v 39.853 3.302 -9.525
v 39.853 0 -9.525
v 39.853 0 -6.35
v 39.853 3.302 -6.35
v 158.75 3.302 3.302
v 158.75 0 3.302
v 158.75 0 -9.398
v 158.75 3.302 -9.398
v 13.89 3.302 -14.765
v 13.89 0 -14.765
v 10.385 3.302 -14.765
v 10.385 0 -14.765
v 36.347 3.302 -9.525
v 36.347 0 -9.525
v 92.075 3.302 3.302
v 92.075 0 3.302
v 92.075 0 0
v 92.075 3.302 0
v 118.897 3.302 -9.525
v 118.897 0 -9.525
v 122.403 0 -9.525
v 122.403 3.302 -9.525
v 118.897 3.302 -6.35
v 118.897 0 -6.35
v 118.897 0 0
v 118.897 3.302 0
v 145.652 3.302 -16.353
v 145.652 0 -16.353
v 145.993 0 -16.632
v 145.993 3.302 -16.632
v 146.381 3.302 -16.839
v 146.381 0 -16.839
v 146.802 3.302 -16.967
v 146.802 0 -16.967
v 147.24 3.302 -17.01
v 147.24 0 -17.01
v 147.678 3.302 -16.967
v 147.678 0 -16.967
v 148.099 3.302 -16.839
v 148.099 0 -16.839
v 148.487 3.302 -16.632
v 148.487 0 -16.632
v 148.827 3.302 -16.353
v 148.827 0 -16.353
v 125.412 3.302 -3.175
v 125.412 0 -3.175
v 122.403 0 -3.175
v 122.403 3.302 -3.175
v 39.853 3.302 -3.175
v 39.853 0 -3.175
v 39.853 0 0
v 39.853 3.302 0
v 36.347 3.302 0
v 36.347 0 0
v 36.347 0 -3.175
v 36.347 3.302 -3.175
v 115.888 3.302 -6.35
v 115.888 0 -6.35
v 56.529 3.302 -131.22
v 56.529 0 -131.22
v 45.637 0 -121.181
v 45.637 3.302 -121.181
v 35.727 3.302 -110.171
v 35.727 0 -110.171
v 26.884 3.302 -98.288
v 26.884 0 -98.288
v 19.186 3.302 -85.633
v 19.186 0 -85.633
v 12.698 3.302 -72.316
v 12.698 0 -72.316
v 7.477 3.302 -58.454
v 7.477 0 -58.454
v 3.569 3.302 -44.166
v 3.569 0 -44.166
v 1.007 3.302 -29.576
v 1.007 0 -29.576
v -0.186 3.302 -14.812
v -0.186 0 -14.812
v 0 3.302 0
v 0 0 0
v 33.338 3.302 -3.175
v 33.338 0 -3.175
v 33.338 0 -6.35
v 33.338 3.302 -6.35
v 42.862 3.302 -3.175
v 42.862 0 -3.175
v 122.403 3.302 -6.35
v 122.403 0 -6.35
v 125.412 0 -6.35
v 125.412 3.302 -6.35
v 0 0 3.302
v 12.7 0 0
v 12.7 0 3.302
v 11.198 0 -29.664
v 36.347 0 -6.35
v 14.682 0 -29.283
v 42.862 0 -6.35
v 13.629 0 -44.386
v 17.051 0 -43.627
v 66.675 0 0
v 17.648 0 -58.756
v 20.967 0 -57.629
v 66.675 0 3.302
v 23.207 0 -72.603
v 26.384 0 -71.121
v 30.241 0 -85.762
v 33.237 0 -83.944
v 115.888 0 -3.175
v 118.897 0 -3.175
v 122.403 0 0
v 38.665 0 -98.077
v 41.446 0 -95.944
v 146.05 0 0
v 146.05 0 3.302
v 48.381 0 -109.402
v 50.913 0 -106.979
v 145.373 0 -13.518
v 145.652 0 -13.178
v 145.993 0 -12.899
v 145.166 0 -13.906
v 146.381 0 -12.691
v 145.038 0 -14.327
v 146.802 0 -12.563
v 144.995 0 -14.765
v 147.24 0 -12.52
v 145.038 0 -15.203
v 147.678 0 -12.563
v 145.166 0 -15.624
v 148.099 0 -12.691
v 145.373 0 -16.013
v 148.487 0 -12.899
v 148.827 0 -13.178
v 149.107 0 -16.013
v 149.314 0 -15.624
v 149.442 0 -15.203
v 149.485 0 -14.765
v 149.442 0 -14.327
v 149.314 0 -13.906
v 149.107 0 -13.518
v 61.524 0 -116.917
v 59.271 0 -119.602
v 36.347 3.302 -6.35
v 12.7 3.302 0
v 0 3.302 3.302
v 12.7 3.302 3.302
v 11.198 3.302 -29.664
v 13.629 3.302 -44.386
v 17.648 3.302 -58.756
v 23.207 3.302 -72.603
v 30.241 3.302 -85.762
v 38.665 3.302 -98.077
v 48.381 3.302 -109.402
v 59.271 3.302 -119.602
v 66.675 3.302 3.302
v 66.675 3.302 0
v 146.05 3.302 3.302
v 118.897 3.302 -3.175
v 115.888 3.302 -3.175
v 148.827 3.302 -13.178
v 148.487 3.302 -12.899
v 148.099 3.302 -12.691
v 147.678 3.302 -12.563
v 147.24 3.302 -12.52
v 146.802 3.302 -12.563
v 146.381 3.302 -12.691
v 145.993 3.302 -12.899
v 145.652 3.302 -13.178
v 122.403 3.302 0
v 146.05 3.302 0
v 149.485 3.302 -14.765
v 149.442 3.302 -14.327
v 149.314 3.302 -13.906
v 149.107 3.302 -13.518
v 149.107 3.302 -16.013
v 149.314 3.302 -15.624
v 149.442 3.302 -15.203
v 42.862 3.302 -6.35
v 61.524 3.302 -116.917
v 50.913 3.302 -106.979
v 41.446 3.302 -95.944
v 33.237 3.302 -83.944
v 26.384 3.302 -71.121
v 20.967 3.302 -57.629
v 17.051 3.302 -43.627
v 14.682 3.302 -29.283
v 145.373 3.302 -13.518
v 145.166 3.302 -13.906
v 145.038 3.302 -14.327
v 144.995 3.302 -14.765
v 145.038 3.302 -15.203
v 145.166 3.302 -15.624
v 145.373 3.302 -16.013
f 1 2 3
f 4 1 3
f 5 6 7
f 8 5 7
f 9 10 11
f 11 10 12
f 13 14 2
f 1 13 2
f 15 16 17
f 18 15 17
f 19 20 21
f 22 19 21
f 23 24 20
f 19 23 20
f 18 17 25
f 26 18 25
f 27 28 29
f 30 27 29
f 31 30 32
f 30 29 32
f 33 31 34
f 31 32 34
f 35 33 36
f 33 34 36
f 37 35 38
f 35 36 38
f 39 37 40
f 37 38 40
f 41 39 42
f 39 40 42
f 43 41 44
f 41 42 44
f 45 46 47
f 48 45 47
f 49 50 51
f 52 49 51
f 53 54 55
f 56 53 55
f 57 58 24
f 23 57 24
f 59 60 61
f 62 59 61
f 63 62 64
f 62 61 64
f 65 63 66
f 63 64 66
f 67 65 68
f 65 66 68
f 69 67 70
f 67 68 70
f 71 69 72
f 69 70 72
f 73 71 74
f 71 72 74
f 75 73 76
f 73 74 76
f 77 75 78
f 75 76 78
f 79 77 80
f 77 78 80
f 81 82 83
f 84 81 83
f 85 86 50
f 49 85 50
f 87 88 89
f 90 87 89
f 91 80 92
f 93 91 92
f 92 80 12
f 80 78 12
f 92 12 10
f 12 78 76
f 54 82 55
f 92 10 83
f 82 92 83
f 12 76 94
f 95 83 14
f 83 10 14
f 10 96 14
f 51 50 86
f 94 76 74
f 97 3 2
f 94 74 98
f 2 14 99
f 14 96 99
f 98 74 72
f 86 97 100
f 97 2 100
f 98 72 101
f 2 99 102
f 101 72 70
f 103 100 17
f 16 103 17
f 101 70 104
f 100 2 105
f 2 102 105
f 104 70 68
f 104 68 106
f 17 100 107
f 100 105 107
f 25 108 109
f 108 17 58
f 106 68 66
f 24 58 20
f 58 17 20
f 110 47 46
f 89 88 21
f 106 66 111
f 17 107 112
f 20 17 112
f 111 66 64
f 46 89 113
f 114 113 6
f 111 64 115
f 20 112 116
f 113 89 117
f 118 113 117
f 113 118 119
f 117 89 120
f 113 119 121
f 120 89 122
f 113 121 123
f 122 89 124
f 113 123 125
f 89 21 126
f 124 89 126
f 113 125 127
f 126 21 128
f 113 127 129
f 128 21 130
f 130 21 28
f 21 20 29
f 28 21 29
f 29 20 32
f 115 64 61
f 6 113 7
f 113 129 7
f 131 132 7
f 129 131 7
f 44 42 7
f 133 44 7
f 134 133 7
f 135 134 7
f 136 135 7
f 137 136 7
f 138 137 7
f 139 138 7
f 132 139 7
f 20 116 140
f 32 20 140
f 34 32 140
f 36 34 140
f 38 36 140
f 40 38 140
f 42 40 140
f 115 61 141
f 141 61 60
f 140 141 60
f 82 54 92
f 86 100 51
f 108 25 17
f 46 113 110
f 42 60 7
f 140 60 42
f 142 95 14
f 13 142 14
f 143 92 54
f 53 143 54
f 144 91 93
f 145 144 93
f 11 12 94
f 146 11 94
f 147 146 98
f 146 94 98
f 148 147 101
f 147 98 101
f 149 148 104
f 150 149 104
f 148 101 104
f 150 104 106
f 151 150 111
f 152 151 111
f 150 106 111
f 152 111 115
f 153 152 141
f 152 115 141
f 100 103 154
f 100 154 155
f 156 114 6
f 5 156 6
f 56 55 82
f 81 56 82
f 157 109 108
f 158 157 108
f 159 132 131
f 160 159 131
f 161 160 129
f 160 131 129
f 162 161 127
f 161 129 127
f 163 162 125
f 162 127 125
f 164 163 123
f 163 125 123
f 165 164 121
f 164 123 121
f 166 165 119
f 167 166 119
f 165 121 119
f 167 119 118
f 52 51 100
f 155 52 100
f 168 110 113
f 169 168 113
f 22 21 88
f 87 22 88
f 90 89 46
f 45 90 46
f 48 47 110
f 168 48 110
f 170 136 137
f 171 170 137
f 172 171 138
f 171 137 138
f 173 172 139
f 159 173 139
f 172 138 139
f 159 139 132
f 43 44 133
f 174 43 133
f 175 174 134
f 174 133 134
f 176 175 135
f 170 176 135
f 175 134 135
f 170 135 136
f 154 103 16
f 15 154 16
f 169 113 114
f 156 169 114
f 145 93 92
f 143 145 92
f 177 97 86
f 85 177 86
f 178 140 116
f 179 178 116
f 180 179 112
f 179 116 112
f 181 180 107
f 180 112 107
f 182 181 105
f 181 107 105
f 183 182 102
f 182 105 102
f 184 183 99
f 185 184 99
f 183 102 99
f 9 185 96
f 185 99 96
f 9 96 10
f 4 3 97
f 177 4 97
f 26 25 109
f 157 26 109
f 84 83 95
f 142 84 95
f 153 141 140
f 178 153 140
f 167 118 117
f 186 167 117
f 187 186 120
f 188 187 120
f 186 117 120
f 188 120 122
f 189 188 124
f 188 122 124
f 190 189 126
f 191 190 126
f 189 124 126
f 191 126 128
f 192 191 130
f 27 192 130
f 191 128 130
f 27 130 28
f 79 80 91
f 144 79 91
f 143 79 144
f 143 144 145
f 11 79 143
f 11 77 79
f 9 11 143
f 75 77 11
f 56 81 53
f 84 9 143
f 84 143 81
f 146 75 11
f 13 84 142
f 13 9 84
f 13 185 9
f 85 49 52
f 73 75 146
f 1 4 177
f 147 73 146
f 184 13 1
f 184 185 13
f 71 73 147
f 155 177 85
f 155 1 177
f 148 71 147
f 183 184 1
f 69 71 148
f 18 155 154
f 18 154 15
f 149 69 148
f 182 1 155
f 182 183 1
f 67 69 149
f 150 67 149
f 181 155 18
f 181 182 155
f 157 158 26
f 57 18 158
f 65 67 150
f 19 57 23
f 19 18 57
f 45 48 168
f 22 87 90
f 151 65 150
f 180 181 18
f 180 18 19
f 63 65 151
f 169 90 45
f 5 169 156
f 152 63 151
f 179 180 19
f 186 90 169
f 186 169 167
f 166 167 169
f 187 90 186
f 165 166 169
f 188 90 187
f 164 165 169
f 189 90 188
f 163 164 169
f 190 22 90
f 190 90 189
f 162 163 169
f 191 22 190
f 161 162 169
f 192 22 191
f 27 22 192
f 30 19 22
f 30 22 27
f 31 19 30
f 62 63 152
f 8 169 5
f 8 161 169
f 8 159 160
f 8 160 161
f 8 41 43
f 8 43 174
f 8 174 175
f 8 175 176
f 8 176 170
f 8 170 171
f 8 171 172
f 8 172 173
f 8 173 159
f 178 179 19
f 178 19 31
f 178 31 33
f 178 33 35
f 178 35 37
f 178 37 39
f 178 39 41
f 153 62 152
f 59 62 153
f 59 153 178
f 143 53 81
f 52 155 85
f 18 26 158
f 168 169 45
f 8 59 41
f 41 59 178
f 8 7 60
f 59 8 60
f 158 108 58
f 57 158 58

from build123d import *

# Parameters (mm, degrees)
SKETCH1_R           = 2.24506403
BOSS_EXTRUDE1_DEPTH = 3.302


with BuildPart() as part:
    # Sketch1 → Boss-Extrude1 (new body)
    with BuildSketch(Plane(origin=(0, 0, 0), x_dir=(1, 0, 0), z_dir=(0, 1, 0))):
        with BuildLine():
            Line((12.7, -3.302), (12.7, 0))
            Line((12.7, 0), (36.3474, 0))
            Line((36.3474, 0), (36.3474, 3.175))
            Line((36.3474, 3.175), (33.3375, 3.175))
            Line((33.3375, 3.175), (33.3375, 6.35))
            Line((33.3375, 6.35), (36.3474, 6.35))
            Line((36.3474, 6.35), (36.3474, 9.525))
            Line((36.3474, 9.525), (39.8526, 9.525))
            Line((39.8526, 9.525), (39.8526, 6.35))
            Line((39.8526, 6.35), (42.8625, 6.35))
            Line((42.8625, 6.35), (42.8625, 3.175))
            Line((42.8625, 3.175), (39.8526, 3.175))
            Line((39.8526, 3.175), (39.8526, 0))
            Line((39.8526, 0), (66.675, 0))
            Line((66.675, 0), (66.675, -3.302))
            Line((66.675, -3.302), (92.075, -3.302))
            Line((92.075, -3.302), (92.075, 0))
            Line((92.075, 0), (118.8974, 0))
            Line((118.8974, 0), (118.8974, 3.175))
            Line((118.8974, 3.175), (115.8875, 3.175))
            Line((115.8875, 3.175), (115.8875, 6.35))
            Line((115.8875, 6.35), (118.8974, 6.35))
            Line((118.8974, 6.35), (118.8974, 9.525))
            Line((118.8974, 9.525), (122.4026, 9.525))
            Line((122.4026, 9.525), (122.4026, 6.35))
            Line((122.4026, 6.35), (125.4125, 6.35))
            Line((125.4125, 6.35), (125.4125, 3.175))
            Line((125.4125, 3.175), (122.4026, 3.175))
            Line((122.4026, 3.175), (122.4026, 0))
            Line((122.4026, 0), (146.05, 0))
            Line((146.05, 0), (146.05, -3.302))
            Line((146.05, -3.302), (158.75, -3.302))
            Line((158.75, -3.302), (158.75, 9.398))
            Line((158.75, 9.398), (56.528812184, 131.220467819))
            ThreePointArc((56.528812184, 131.220467819), (12.697978408, 72.316136438), (0, 0))
            Line((0, 0), (0, -3.302))
            Line((0, -3.302), (12.7, -3.302))
        make_face()
        with Locations((147.239891105, 14.765251924)):
            Circle(SKETCH1_R, mode=Mode.SUBTRACT)
        with BuildLine():
            Line((13.889891105, 14.765251924), (10.384691105, 14.765251924))
            ThreePointArc((10.384691105, 14.765251924), (23.206957648, 72.602758658), (59.271064223, 119.602417396))
            Line((59.271064223, 119.602417396), (61.524163353, 116.917278414))
            ThreePointArc((61.524163353, 116.917278414), (26.383747703, 71.121397127), (13.889891105, 14.765251924))
        make_face(mode=Mode.SUBTRACT)
    extrude(amount=BOSS_EXTRUDE1_DEPTH)


solid = part.part
